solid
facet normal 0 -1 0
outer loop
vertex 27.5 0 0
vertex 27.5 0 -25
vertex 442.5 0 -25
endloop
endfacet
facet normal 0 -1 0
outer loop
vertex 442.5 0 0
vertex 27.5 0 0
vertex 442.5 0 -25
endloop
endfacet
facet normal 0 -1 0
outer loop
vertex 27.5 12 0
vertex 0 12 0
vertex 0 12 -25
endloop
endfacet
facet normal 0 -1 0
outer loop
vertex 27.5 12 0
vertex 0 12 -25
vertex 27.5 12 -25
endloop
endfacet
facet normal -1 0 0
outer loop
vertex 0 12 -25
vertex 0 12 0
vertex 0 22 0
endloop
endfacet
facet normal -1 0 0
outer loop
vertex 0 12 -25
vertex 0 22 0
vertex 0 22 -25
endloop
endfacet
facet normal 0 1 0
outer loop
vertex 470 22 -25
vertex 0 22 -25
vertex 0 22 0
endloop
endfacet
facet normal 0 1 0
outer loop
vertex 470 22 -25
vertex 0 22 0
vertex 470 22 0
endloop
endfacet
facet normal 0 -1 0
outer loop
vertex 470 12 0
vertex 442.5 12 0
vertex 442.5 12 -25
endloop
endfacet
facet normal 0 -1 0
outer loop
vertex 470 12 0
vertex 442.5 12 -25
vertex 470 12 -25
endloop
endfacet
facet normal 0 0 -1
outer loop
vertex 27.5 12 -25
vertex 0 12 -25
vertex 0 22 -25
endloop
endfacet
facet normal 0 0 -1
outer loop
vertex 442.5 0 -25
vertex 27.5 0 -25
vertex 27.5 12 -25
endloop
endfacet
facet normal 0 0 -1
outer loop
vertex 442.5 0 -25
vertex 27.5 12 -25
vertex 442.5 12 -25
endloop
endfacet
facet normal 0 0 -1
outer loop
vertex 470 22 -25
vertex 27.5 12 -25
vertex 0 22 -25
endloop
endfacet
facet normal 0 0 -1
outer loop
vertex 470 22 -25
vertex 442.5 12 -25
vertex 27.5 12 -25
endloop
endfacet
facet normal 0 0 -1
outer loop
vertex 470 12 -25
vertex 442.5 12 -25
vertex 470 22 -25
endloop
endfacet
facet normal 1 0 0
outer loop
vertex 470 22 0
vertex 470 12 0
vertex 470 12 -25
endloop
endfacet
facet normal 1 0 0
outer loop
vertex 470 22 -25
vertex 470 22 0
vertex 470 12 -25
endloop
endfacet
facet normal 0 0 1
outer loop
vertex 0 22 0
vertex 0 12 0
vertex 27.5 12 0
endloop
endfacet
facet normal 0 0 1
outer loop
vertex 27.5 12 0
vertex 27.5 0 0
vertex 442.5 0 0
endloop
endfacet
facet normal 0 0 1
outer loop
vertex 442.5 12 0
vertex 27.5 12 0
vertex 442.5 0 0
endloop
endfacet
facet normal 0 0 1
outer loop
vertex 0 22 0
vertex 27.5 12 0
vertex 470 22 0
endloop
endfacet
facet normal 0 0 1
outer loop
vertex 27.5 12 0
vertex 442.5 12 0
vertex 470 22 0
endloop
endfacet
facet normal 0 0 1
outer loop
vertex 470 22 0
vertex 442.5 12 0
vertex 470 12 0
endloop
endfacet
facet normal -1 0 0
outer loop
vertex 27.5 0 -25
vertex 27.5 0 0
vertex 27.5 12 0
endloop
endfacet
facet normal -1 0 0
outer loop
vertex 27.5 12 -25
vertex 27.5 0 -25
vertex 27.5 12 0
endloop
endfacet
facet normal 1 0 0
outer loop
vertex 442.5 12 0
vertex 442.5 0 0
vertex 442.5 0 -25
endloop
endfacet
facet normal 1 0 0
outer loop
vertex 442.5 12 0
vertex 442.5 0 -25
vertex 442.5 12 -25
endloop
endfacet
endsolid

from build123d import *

# Parameters (mm, degrees)
SKETCH_1_W          = 470
SKETCH_1_H          = 25
EXTRUDE_1_DEPTH     = 22
SKETCH_2_W          = 27.5
SKETCH_2_H          = 12
CUT_EXTRUDE_1_DEPTH = 472.178310197
SKETCH_3_W          = 27.5
SKETCH_3_H          = 12
CUT_EXTRUDE_2_DEPTH = 472.178310197


with BuildPart() as part:
    # Эскиз1 → Бобышка-Вытянуть1 (new body)
    with BuildSketch(Plane(origin=(0, 0, 0), x_dir=(1, 0, 0), z_dir=(0, 1, 0))):
        with Locations((235, 12.5)):
            Rectangle(SKETCH_1_W, SKETCH_1_H)
    extrude(amount=EXTRUDE_1_DEPTH)

    # Эскиз2 → Вырез-Вытянуть1 (cut, through all)
    with BuildSketch(Plane.XY):
        with Locations((456.25, 6)):
            Rectangle(SKETCH_2_W, SKETCH_2_H)
    extrude(amount=-CUT_EXTRUDE_1_DEPTH, mode=Mode.SUBTRACT)

    # Эскиз3 → Вырез-Вытянуть2 (cut, through all)
    with BuildSketch(Plane.XY):
        with Locations((13.75, 6)):
            Rectangle(SKETCH_3_W, SKETCH_3_H)
    extrude(amount=-CUT_EXTRUDE_2_DEPTH, mode=Mode.SUBTRACT)


solid = part.part
